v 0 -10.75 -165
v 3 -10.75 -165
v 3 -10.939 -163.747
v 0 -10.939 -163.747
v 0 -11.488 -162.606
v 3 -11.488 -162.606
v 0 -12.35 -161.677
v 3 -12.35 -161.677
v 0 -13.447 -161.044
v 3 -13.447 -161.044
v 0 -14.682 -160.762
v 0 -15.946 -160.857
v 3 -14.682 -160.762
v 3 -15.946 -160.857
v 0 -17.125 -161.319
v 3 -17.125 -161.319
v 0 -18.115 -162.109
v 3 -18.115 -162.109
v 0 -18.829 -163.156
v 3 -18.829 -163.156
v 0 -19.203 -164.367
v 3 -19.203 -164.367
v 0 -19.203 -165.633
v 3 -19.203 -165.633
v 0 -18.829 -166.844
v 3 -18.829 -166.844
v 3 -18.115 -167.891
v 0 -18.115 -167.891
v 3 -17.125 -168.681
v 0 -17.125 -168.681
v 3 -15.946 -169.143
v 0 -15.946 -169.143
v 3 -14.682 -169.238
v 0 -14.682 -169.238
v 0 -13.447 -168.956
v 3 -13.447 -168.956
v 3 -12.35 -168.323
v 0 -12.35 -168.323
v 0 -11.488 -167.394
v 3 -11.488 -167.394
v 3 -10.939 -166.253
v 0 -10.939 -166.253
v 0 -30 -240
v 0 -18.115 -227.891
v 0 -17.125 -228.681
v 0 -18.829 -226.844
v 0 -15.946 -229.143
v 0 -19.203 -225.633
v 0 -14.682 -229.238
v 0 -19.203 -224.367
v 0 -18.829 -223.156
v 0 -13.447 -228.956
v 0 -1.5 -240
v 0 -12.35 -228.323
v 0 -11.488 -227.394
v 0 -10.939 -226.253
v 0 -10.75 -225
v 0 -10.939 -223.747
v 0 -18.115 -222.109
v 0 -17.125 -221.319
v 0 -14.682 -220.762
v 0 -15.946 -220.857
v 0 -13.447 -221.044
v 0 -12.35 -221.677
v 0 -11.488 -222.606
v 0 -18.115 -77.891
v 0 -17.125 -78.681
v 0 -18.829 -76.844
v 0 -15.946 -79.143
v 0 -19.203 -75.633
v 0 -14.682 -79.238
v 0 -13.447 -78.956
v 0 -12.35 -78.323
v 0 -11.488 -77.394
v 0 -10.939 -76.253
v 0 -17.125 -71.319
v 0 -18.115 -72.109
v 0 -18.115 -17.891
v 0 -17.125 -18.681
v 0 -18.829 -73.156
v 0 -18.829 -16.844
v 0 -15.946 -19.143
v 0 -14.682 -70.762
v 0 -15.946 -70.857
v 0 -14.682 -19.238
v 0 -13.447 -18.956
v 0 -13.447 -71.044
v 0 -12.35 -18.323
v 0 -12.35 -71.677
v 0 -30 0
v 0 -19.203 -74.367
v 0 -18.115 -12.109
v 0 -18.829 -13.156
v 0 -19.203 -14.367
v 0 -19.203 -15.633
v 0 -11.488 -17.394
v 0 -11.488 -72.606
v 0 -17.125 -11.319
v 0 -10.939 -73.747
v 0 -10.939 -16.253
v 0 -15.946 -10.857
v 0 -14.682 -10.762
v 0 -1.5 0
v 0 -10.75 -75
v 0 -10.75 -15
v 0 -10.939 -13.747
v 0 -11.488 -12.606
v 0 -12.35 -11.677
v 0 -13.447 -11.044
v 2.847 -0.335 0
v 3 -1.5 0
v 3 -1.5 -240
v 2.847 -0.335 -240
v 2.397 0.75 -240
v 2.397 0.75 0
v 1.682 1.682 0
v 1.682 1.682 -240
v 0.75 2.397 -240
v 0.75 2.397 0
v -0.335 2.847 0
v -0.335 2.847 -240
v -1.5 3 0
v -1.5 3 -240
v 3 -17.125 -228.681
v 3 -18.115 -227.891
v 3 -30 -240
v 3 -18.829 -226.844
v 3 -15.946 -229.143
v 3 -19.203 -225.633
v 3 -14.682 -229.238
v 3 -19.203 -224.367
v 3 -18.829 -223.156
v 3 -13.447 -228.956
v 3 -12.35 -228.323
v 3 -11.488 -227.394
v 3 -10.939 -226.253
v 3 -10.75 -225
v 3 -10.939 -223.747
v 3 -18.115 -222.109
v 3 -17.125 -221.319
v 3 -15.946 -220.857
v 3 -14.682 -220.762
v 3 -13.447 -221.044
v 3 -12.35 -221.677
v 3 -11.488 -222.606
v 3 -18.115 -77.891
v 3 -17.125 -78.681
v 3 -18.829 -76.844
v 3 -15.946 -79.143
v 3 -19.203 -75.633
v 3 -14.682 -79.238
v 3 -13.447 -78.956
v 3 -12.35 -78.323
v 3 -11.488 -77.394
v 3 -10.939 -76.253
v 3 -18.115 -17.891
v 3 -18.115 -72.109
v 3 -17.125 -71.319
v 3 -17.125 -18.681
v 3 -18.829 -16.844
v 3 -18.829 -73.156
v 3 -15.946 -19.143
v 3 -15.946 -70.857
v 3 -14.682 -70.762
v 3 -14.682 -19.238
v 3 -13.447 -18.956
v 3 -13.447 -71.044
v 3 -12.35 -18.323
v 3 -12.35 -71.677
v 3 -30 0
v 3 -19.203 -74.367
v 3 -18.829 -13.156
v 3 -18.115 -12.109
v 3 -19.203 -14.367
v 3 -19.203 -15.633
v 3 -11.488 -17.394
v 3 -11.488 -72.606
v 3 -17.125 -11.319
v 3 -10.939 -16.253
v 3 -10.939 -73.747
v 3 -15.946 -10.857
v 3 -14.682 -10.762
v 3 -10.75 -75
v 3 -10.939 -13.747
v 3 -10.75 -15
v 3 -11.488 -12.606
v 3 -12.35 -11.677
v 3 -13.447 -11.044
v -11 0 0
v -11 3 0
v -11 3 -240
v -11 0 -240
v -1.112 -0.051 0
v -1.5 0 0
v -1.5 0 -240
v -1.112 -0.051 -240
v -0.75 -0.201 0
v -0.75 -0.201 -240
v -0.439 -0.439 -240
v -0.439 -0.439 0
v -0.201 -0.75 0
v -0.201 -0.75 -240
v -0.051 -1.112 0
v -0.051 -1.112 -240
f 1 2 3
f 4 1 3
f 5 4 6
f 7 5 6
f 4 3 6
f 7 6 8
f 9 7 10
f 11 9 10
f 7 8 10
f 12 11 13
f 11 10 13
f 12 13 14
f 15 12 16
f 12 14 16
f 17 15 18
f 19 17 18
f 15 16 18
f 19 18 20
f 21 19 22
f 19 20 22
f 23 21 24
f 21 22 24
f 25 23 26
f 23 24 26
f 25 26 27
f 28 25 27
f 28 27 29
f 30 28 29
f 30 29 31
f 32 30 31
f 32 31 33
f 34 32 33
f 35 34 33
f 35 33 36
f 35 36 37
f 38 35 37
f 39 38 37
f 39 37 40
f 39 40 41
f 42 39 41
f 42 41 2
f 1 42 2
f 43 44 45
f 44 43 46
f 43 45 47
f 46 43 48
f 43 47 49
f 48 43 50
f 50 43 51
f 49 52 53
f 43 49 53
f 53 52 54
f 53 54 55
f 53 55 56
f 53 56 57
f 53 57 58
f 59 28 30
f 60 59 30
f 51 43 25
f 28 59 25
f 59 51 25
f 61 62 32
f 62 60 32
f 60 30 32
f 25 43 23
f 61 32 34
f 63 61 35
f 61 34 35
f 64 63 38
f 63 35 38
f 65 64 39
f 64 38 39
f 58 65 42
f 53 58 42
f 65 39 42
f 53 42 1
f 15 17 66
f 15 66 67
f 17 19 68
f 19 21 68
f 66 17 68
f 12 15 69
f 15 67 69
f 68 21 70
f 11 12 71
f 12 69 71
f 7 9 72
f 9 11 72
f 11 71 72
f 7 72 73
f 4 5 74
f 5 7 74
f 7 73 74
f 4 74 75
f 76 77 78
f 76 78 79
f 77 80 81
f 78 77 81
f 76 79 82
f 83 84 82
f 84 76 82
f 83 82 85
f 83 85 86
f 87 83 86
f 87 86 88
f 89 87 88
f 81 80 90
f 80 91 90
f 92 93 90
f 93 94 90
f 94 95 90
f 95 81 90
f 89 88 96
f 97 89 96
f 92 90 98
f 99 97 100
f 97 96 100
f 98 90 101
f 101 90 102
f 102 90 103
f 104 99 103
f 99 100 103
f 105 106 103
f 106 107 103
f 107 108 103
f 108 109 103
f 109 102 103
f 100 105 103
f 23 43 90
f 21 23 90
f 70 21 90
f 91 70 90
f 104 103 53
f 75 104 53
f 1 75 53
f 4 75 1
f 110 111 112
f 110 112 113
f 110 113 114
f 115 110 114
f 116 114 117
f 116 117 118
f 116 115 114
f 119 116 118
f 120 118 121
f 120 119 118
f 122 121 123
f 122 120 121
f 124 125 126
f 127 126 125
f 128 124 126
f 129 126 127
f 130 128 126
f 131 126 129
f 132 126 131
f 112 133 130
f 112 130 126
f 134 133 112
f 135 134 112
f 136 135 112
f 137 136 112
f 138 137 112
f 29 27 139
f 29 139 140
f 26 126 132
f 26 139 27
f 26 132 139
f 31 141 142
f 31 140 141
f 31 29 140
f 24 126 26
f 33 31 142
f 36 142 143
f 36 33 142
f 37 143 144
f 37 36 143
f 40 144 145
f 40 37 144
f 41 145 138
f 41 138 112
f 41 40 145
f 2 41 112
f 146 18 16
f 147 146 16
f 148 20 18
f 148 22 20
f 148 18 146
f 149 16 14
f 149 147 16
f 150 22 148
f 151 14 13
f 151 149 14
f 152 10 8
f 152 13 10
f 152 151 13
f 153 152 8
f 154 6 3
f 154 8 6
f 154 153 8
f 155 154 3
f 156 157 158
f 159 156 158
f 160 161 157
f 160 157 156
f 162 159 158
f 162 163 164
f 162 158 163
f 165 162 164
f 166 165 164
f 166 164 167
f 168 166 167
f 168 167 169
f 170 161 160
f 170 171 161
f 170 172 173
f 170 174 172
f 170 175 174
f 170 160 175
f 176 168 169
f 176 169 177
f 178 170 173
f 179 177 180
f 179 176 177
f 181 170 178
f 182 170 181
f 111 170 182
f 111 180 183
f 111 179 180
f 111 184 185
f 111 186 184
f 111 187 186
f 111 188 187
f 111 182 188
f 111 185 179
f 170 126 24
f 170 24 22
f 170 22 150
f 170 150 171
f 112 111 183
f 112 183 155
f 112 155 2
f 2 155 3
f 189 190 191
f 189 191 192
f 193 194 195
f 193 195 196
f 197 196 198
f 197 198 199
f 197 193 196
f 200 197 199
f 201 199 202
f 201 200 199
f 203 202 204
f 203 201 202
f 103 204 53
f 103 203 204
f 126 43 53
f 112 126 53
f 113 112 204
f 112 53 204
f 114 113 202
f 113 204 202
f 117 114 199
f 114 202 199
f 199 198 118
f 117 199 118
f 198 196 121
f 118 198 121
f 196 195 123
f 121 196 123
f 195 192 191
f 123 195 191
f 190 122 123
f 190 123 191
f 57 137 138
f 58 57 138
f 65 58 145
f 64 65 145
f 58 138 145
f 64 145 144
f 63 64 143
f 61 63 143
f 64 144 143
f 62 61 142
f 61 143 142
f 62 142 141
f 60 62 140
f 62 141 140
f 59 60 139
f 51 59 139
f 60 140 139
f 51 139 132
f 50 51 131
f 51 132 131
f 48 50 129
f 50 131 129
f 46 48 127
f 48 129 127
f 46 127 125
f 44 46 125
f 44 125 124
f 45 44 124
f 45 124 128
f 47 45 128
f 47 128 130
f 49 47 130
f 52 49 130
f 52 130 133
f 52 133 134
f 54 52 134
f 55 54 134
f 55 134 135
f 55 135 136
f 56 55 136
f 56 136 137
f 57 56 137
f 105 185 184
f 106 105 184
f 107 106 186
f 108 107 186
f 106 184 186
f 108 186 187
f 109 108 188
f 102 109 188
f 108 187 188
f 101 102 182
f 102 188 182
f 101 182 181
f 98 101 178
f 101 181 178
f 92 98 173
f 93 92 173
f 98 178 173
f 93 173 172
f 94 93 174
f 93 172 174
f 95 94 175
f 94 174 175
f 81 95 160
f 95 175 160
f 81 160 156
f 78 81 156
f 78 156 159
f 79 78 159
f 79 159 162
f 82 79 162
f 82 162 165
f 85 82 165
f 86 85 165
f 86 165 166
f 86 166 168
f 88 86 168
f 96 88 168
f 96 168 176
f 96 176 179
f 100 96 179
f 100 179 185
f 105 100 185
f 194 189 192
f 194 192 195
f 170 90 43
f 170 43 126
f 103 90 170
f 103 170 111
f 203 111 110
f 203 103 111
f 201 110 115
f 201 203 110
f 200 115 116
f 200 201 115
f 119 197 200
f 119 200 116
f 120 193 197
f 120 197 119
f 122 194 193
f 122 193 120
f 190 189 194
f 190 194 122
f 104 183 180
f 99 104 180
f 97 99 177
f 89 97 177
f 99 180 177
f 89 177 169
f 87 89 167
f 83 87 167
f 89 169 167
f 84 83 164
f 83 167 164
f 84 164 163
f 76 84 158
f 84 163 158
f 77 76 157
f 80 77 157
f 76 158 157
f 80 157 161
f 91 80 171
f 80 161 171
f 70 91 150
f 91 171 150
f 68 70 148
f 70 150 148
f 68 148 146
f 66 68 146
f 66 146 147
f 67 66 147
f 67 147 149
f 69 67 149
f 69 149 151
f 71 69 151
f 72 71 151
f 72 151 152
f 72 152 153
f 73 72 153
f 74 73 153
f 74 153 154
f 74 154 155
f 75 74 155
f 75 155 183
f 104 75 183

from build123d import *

# Parameters (mm, degrees)
SKETCH_1_W                       = 3
SKETCH_1_H                       = 30
SM_BASE_FLANGE_1_DEPTH           = 240
SKETCH_6_R                       = 4.25
CUT_EXTRUDE_1_DEPTH              = 242.886336944
SM_EDGE_FLANGE_1_STRIP_W         = 15
SM_EDGE_FLANGE_1_STRIP_H         = 3
SM_EDGE_FLANGE_1_STRIP_CUT_DEPTH = 240
SM_EDGE_FLANGE_1_DEPTH           = 240


# Sheet-metal steps are written as plain solids
with BuildPart() as part:
    # Sketch 1 → Базовая кромка1 (new body)
    with BuildSketch(Plane.XY):
        with Locations((1.5, -15)):
            Rectangle(SKETCH_1_W, SKETCH_1_H)
    extrude(amount=-SM_BASE_FLANGE_1_DEPTH)

    # Эскиз6 → Вырез-Вытянуть1 (cut, through all)
    with BuildSketch(Plane(origin=(3, 0, 0), x_dir=(0, 0, -1), z_dir=(1, 0, 0))):
        with Locations(Location((225, -15, 0), (0, 0, 90))):
            Circle(SKETCH_6_R)
        with Locations(Location((165, -15, 0), (0, 0, 90))):
            Circle(SKETCH_6_R)
        with Locations(Location((75, -15, 0), (0, 0, 90))):
            Circle(SKETCH_6_R)
        with Locations(Location((15, -15, 0), (0, 0, 90))):
            Circle(SKETCH_6_R)
    extrude(amount=-CUT_EXTRUDE_1_DEPTH, mode=Mode.SUBTRACT)

    # Ребро-кромка1 strip (across the edge) → Ребро-кромка1 strip cut (cut)
    with BuildSketch(Plane(origin=(0, 0, 0), x_dir=(0, -1, 0), z_dir=(0, 0, -1))):
        with Locations((-6, -1.5)):
            Rectangle(SM_EDGE_FLANGE_1_STRIP_W, SM_EDGE_FLANGE_1_STRIP_H)
    extrude(amount=SM_EDGE_FLANGE_1_STRIP_CUT_DEPTH, mode=Mode.SUBTRACT)

    # Ребро-кромка1 section (across the edge) → Ребро-кромка1 (add)
    with BuildSketch(Plane(origin=(0, 0, 0), x_dir=(0, -1, 0), z_dir=(0, 0, -1))):
        with BuildLine():
            Line((-3, 1.5), (-3, 11))
            Line((-3, 11), (0, 11))
            Line((0, 11), (0, 1.5))
            ThreePointArc((0, 1.5), (0.439339828, 0.439339828), (1.5, 0))
            Line((1.5, 0), (1.5, -3))
            ThreePointArc((1.5, -3), (-1.681980515, -1.681980515), (-3, 1.5))
        make_face()
    extrude(amount=SM_EDGE_FLANGE_1_DEPTH)


solid = part.part
